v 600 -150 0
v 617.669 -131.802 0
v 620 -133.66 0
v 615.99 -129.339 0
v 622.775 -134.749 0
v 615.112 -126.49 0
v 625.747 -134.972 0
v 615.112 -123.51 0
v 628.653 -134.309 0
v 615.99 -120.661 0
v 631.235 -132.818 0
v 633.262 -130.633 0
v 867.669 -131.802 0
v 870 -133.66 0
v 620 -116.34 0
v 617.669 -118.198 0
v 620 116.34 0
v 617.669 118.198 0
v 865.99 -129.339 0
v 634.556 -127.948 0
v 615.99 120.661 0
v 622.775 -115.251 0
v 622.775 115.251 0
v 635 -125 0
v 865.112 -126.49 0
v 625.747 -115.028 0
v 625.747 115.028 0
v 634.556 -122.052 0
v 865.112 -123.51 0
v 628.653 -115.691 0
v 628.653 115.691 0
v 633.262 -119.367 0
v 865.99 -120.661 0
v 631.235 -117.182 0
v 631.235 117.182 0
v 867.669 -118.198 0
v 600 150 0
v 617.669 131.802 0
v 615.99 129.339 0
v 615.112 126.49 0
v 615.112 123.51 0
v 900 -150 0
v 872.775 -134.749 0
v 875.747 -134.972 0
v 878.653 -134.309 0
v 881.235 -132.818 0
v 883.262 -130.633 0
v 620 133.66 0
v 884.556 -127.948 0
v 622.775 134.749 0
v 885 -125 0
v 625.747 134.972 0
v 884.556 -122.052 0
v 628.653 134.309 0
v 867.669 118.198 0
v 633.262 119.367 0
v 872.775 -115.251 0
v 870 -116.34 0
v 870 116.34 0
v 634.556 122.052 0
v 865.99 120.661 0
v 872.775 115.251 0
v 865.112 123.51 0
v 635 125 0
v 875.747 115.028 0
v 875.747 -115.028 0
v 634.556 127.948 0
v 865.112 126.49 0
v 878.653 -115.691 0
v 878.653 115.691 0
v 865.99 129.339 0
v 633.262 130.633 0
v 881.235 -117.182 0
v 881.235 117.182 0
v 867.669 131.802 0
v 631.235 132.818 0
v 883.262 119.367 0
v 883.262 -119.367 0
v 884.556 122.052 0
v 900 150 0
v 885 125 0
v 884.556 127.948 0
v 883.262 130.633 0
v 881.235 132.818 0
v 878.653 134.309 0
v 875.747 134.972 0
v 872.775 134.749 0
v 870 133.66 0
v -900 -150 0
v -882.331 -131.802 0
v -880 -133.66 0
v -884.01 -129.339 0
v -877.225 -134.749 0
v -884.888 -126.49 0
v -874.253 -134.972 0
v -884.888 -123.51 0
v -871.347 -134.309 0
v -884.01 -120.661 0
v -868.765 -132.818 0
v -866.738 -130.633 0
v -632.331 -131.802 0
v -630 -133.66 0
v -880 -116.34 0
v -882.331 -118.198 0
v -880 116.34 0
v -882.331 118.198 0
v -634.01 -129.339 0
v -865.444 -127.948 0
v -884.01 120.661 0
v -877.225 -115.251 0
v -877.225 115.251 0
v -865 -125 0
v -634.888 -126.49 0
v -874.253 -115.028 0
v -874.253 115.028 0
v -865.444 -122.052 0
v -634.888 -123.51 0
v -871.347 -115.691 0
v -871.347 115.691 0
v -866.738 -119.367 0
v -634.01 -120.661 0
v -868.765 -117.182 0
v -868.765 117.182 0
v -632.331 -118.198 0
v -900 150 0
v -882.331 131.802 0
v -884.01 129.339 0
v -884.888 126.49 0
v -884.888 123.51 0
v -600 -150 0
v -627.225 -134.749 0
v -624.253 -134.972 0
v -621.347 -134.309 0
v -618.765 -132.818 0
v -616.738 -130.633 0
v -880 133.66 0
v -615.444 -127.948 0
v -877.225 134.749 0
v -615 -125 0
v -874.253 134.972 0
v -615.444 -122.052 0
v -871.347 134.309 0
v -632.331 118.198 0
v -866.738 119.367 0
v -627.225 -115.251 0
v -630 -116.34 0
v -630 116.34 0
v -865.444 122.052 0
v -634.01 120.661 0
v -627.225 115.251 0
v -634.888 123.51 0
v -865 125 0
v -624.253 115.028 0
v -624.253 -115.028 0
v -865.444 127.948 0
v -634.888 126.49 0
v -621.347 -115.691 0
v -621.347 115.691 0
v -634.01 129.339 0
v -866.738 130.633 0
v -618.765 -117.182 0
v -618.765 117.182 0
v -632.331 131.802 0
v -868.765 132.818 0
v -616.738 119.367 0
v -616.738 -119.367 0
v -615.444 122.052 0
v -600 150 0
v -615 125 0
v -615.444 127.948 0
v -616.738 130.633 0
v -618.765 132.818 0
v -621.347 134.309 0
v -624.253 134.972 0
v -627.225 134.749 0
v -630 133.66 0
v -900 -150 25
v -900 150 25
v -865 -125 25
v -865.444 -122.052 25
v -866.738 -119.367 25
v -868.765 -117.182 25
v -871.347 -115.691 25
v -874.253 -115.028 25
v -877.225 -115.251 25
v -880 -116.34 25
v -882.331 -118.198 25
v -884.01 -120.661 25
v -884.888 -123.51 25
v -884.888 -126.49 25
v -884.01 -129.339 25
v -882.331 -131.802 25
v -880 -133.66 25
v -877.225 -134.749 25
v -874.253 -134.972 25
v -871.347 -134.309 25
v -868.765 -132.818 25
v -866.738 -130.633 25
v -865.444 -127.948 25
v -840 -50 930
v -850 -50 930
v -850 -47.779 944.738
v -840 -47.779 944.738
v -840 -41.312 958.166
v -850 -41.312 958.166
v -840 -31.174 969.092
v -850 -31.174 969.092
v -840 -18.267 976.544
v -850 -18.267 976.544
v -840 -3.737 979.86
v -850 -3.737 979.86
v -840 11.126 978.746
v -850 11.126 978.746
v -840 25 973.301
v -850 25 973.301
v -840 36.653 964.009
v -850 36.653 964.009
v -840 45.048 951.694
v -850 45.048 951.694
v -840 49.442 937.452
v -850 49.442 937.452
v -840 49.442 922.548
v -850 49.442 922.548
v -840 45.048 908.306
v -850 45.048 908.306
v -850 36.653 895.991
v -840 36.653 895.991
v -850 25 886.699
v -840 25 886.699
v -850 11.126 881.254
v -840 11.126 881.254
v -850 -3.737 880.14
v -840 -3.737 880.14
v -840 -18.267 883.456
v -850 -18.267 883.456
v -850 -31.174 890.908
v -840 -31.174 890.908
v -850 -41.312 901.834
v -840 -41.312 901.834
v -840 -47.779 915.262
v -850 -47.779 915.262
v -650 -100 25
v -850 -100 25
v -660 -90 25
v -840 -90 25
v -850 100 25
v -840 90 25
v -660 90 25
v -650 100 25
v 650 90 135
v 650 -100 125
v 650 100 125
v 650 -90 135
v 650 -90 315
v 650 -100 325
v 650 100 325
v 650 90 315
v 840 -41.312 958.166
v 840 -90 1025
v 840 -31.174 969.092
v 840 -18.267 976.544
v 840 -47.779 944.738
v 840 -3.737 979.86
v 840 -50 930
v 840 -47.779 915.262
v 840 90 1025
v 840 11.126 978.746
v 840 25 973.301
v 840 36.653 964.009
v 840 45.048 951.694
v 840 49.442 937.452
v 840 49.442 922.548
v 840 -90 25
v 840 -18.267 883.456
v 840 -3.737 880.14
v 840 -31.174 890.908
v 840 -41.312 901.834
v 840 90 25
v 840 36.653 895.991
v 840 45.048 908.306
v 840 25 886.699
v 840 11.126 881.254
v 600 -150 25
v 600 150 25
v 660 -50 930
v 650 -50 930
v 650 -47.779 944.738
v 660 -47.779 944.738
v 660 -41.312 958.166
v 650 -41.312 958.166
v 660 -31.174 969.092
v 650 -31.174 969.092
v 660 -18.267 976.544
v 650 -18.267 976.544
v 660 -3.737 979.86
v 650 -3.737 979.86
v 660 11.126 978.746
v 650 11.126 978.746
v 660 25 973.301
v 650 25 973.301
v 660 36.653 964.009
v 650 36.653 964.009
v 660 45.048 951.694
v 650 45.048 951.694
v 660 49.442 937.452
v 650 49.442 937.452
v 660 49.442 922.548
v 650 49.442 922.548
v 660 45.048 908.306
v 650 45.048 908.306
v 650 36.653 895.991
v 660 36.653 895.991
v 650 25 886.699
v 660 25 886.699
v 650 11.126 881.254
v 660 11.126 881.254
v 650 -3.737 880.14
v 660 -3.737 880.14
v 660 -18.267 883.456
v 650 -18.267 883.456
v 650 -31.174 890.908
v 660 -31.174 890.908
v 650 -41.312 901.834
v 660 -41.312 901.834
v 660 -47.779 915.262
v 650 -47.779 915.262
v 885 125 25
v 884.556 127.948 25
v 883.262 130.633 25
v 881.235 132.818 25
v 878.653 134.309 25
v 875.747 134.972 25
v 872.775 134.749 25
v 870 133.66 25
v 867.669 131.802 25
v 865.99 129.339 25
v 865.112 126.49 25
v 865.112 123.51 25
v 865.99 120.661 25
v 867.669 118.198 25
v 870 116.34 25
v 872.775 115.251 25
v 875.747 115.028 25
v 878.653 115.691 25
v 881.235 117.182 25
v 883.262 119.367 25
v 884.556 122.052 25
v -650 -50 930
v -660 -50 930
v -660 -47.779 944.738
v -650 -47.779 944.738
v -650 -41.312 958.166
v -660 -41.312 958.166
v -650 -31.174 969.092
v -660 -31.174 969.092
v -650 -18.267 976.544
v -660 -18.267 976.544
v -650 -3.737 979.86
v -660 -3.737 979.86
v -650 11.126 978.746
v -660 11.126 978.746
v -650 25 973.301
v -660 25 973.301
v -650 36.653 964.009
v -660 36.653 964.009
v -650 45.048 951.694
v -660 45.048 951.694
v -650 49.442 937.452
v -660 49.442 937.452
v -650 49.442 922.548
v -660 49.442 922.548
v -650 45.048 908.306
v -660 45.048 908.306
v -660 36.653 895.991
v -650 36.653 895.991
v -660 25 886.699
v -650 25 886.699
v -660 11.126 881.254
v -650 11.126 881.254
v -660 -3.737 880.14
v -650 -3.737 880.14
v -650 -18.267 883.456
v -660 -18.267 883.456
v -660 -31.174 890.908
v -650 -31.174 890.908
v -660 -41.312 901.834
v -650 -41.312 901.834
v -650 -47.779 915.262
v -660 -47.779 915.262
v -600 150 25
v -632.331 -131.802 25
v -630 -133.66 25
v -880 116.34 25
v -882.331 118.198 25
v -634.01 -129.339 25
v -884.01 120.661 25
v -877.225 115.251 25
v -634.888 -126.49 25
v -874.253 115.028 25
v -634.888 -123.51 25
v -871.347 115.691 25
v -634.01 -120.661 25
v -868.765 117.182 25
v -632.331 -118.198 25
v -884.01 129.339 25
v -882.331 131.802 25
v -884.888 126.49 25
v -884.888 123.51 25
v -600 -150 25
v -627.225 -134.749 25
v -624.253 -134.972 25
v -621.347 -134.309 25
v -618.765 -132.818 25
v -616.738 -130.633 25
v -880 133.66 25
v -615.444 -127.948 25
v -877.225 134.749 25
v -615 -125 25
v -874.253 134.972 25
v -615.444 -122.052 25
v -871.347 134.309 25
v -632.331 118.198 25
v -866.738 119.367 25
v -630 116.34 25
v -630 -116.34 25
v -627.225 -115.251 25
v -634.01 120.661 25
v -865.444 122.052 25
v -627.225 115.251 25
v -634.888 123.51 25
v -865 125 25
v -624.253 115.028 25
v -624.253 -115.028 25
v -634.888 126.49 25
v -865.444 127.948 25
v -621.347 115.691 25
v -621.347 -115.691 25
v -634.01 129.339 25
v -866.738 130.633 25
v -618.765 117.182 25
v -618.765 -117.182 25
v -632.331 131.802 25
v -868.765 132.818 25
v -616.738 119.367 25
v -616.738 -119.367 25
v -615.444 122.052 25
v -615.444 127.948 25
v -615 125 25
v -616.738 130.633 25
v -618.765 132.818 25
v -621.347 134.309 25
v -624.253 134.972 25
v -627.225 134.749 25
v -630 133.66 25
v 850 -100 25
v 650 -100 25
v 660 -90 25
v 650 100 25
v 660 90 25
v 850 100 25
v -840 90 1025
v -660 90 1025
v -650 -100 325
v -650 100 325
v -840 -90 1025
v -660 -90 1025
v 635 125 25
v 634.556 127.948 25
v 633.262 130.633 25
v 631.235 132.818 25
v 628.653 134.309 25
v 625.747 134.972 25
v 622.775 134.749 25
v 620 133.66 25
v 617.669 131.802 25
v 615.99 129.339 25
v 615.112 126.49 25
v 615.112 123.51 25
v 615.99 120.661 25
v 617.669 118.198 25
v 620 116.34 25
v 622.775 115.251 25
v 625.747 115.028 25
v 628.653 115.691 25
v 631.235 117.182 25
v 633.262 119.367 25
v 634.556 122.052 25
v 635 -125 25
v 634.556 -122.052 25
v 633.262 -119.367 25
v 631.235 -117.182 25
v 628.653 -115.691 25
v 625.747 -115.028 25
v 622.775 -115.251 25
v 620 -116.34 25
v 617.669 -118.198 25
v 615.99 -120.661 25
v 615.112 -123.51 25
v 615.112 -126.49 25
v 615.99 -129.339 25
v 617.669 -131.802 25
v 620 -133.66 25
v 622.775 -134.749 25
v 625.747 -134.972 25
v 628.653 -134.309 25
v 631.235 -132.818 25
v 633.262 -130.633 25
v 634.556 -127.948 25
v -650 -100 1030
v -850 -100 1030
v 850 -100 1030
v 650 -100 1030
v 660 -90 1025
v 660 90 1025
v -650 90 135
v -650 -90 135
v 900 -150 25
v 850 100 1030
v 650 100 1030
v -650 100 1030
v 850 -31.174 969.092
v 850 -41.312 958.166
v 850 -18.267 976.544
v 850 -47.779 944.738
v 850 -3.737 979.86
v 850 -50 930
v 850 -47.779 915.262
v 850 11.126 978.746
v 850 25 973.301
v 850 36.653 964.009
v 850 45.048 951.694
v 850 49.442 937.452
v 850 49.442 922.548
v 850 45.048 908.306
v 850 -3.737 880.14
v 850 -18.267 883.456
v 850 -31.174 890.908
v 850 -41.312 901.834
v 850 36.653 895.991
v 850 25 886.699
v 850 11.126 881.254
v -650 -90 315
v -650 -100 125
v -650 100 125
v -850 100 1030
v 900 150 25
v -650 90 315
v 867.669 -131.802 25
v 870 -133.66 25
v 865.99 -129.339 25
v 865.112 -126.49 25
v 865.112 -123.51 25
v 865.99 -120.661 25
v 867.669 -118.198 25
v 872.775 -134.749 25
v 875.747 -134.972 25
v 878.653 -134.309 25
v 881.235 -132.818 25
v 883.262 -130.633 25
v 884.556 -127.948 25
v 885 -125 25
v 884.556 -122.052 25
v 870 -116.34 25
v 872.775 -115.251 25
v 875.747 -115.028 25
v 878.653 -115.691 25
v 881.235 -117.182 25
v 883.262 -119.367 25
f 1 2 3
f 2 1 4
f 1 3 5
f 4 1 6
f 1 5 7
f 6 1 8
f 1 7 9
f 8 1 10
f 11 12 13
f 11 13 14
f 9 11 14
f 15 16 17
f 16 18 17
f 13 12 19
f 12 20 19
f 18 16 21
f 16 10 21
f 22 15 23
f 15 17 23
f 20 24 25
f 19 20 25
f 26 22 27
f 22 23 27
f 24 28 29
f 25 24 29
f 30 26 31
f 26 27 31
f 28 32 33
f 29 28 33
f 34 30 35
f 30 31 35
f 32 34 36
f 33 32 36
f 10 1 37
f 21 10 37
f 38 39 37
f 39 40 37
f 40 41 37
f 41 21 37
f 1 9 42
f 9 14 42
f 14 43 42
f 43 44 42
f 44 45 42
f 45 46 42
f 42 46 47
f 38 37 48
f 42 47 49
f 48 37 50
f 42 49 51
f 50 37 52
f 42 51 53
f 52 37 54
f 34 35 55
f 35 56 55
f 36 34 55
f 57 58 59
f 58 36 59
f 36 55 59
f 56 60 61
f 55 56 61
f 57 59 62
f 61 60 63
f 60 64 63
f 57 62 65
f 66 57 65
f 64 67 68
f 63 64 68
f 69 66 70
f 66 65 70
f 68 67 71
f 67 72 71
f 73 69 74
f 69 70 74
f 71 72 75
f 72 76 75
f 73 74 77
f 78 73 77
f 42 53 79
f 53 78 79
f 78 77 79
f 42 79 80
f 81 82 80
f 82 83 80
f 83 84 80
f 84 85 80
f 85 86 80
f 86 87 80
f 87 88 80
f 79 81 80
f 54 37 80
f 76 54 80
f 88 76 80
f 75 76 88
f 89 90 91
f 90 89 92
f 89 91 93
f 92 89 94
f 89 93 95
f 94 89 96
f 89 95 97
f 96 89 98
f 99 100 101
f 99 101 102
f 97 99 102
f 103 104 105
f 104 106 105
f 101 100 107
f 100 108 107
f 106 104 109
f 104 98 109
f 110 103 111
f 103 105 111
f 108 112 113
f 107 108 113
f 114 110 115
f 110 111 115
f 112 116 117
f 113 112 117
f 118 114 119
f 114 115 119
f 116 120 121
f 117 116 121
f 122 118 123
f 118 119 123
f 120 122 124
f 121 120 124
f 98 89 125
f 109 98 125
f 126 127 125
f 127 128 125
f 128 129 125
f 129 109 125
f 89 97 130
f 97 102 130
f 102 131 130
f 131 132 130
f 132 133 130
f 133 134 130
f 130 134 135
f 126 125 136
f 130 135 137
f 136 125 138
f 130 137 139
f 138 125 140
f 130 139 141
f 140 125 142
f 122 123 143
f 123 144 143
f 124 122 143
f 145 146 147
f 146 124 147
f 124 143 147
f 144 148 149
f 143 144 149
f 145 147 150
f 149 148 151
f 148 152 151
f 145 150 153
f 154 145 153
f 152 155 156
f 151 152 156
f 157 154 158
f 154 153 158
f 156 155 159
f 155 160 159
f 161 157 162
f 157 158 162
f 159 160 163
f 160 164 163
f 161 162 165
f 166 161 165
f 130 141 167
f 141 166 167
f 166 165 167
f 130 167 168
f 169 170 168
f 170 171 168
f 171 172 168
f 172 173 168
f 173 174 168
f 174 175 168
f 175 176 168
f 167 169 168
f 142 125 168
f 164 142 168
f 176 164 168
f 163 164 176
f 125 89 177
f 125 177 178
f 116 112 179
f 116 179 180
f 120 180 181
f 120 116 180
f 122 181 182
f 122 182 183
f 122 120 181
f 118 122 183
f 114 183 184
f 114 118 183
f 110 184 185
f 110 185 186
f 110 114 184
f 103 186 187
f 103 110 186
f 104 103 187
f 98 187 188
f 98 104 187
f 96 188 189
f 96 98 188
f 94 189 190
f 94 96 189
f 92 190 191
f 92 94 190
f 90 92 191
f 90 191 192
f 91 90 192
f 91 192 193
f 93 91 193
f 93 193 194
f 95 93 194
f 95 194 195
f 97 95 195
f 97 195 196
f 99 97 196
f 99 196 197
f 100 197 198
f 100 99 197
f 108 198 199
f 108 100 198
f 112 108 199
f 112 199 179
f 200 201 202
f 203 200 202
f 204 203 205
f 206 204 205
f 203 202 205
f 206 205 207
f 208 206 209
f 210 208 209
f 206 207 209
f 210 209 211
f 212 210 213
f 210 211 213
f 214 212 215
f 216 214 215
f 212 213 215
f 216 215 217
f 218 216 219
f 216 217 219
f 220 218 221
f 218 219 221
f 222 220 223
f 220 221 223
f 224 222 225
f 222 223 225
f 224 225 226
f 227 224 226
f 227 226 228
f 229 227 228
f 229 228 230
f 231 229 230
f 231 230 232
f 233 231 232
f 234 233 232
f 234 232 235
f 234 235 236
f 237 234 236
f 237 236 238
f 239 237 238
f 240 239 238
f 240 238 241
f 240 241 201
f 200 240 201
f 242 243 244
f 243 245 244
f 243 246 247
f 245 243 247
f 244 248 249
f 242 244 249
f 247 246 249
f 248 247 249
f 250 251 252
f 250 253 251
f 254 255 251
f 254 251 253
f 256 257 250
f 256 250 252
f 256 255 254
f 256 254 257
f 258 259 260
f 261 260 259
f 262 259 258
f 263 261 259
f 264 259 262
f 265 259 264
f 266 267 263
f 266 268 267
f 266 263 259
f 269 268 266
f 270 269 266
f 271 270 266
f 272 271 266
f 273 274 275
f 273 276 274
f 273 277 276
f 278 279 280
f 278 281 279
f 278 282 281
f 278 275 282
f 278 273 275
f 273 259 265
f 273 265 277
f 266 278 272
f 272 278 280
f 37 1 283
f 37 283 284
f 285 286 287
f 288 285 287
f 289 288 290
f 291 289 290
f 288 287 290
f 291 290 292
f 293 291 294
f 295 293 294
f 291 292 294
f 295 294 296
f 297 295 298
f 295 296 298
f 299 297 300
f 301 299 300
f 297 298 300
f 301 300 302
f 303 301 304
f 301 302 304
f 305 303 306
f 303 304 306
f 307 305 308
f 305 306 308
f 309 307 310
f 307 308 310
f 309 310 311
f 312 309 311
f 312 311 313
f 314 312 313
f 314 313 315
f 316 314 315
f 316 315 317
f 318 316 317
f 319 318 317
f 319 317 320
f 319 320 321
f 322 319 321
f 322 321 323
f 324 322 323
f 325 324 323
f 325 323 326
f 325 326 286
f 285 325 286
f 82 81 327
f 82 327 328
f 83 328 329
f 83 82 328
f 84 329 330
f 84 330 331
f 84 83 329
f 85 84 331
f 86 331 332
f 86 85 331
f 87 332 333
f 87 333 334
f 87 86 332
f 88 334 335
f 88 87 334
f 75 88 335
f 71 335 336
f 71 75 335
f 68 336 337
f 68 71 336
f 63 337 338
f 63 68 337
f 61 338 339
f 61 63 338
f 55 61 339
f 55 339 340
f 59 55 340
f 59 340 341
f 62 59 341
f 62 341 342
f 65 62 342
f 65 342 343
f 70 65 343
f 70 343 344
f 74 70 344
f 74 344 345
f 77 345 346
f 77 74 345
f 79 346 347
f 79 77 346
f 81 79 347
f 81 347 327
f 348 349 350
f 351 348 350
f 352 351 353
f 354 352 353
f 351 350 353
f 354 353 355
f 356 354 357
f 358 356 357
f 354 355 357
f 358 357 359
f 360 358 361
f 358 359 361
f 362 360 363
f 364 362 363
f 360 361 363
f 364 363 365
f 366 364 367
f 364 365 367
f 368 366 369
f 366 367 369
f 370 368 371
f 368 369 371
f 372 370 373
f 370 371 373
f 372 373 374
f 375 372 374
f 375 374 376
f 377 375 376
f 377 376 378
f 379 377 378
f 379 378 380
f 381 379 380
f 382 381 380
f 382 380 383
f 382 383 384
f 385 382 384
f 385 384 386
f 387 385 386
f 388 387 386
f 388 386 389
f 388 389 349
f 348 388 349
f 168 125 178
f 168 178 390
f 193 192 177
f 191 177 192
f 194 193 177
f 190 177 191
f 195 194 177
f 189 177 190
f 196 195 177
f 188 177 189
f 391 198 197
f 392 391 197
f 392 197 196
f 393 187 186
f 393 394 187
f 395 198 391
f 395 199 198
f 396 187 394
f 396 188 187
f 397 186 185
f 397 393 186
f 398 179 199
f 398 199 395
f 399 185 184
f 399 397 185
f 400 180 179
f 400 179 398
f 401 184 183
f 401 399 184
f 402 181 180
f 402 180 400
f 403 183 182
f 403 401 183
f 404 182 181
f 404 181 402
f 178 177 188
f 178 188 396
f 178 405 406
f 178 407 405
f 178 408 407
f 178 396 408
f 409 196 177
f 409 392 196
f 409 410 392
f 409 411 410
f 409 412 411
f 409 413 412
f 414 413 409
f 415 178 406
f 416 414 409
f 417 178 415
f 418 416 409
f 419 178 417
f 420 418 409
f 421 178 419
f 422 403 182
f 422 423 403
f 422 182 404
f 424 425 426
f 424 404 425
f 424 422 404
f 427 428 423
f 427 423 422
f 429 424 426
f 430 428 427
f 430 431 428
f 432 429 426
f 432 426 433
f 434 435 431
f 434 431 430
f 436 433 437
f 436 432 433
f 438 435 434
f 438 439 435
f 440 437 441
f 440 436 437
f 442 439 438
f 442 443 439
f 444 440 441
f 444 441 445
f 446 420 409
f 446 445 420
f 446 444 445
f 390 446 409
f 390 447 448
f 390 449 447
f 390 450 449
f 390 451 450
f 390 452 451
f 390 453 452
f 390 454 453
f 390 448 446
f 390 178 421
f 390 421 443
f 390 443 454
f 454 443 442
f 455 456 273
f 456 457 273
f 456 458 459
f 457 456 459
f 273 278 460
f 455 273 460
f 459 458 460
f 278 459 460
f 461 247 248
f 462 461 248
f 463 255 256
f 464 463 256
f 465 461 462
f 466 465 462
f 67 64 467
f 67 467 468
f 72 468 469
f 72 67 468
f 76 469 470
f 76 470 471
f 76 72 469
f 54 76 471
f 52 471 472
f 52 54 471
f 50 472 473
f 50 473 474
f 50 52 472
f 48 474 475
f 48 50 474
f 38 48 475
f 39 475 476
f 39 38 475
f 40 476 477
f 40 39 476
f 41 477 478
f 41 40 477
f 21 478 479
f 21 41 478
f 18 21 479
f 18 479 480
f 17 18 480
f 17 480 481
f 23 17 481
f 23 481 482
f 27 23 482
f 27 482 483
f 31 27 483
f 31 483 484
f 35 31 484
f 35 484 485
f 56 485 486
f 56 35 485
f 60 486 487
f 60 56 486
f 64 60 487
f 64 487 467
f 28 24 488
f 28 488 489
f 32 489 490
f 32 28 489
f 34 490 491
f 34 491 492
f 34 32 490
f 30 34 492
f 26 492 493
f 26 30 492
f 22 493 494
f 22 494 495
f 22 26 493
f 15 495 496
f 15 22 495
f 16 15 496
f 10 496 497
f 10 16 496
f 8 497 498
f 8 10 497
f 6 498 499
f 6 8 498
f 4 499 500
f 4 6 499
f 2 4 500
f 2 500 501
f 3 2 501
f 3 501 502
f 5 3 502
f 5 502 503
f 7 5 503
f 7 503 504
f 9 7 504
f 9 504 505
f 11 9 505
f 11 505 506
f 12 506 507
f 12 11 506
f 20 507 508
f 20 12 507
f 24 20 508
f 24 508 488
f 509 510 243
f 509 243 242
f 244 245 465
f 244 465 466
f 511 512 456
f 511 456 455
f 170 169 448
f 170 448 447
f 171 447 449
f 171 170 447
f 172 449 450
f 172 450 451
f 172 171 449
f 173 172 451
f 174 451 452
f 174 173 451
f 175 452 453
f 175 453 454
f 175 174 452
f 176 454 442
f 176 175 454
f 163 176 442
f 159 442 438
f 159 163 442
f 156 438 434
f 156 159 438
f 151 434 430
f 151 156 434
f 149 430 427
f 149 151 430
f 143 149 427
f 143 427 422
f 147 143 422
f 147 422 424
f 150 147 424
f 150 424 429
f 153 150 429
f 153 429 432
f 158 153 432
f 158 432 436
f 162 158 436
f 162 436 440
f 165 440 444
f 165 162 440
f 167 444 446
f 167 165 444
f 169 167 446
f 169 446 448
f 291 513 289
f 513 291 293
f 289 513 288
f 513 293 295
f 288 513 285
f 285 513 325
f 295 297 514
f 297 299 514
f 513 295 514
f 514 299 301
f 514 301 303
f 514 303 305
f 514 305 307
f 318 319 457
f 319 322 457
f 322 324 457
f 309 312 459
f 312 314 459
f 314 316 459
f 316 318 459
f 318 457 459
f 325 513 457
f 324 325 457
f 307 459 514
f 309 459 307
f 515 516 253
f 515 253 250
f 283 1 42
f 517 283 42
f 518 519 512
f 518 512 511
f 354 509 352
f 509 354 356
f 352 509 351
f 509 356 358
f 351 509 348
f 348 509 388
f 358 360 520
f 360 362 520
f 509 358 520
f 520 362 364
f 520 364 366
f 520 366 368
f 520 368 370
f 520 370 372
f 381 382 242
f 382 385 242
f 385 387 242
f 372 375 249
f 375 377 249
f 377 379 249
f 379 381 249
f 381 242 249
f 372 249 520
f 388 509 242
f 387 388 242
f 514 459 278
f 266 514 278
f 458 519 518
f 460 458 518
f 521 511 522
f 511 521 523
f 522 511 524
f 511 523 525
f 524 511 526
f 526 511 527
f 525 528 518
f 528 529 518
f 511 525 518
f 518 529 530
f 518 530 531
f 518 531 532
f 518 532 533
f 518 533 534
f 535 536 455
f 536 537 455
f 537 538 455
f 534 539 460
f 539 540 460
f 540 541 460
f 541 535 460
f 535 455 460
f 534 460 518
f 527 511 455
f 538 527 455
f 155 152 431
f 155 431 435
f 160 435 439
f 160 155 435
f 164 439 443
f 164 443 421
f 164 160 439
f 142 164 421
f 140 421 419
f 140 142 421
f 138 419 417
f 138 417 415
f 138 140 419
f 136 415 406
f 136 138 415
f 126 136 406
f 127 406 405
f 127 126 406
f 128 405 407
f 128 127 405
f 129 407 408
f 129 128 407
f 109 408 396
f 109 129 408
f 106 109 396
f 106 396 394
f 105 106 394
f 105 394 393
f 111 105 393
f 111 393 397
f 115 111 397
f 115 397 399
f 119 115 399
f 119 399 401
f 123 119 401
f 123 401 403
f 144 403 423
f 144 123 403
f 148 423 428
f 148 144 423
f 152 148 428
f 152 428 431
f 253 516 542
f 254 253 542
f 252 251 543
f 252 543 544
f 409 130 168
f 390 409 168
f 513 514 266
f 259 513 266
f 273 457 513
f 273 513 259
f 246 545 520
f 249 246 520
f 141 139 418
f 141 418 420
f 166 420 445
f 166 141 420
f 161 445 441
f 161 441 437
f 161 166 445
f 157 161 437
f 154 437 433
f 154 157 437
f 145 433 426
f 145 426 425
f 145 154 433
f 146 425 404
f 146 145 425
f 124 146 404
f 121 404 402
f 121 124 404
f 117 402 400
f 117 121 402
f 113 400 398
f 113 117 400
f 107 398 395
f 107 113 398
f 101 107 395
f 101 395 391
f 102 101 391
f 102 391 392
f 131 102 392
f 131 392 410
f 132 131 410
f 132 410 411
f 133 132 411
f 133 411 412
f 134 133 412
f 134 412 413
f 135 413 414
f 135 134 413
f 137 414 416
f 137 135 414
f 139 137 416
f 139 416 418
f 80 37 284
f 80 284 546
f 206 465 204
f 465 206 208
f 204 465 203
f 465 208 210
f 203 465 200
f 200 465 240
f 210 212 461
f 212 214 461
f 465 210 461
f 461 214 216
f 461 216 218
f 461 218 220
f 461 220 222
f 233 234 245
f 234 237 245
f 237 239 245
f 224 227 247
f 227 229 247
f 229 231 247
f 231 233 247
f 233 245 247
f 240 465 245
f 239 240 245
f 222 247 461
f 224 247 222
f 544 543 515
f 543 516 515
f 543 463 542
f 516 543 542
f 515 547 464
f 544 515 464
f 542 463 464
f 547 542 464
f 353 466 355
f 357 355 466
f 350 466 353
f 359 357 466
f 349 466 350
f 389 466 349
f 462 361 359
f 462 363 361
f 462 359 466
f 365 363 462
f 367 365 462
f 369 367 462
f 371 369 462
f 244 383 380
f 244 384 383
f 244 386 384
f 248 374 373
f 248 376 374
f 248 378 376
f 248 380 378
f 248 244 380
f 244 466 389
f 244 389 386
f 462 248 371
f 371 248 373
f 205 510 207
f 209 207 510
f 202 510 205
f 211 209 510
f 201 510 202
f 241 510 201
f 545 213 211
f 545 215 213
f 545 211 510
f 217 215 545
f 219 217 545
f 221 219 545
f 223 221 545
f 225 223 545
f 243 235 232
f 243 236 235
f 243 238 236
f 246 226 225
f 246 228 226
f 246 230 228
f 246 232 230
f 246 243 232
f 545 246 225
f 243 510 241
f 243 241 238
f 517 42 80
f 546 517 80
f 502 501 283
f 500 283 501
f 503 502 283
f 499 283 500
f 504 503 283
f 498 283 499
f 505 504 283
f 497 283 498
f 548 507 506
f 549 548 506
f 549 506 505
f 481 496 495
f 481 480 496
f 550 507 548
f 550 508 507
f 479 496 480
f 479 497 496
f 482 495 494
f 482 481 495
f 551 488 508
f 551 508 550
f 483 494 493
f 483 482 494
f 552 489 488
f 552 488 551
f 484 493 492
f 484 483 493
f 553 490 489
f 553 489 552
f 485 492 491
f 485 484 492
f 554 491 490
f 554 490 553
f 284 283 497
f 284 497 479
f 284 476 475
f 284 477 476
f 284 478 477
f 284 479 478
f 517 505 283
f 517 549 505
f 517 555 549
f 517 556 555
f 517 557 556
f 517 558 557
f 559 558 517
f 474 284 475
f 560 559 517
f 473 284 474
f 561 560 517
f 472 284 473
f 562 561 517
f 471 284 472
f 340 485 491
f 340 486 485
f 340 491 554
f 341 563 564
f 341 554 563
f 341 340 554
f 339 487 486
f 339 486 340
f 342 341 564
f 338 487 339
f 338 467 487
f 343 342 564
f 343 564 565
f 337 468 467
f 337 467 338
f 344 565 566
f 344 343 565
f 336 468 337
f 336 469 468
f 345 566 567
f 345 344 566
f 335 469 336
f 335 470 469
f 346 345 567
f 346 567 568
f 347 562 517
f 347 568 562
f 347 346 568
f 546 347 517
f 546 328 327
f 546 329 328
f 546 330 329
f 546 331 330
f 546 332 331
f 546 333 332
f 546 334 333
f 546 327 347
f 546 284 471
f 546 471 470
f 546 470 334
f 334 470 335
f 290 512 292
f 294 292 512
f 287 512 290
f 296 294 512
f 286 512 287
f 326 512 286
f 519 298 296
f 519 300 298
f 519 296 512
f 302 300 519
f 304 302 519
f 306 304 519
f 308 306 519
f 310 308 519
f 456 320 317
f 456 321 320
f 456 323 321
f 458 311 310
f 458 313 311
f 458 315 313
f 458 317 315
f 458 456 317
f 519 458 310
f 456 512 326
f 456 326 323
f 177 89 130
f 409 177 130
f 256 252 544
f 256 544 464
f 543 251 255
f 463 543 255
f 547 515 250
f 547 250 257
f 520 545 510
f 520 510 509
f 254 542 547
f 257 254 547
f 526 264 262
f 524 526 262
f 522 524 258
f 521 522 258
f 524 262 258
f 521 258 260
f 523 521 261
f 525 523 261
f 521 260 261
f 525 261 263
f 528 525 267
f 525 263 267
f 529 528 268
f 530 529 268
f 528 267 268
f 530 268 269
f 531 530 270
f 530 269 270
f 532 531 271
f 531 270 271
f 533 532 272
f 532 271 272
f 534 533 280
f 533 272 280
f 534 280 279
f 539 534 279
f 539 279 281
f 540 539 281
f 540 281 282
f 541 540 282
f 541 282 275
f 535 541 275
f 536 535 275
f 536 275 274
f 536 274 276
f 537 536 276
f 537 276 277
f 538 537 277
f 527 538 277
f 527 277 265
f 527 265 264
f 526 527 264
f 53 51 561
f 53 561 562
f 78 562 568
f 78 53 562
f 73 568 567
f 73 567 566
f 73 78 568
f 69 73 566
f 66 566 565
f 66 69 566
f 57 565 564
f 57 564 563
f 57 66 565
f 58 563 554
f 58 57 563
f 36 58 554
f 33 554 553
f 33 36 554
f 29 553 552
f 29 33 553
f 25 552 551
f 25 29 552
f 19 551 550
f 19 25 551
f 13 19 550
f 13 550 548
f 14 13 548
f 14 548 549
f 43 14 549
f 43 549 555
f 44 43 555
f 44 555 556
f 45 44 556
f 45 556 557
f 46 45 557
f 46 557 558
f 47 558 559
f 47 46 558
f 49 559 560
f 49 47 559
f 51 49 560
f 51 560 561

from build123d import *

# Parameters (mm, degrees)
F0_W      = 300
F0_H      = 300
F0_R      = 10
F1_DEPTH  = 25
F2_W      = 200
F2_H      = 200
F2_W_2    = 180
F2_H_2    = 180
F3_DEPTH  = 1000
F4_W      = 200
F4_H      = 200
F4_W_2    = 180
F4_H_2    = 180
F5_DEPTH  = 1300
F6_W      = 200
F6_H      = 200
F7_DEPTH  = 5
F8_W      = 200
F8_H      = 200
F9_DEPTH  = 5
F10_R     = 50
F11_DEPTH = 1750.001


with BuildPart() as f1:
    # F0 (on Top) → F1 (new body)
    with BuildSketch(Plane.XY):
        with Locations((-750, 0)):
            Rectangle(F0_W, F0_H)
        with Locations((-875, -125)):
            Circle(F0_R, mode=Mode.SUBTRACT)
        with Locations((-625, -125)):
            Circle(F0_R, mode=Mode.SUBTRACT)
        with Locations((-875, 125)):
            Circle(F0_R, mode=Mode.SUBTRACT)
        with Locations((-625, 125)):
            Circle(F0_R, mode=Mode.SUBTRACT)
    extrude(amount=F1_DEPTH)


with BuildPart() as f1b:
    # F0 (on Top) → F1, piece 2 (new body)
    with BuildSketch(Plane.XY):
        with Locations((750, 0)):
            Rectangle(F0_W, F0_H)
        with Locations((625, -125)):
            Circle(F0_R, mode=Mode.SUBTRACT)
        with Locations((875, -125)):
            Circle(F0_R, mode=Mode.SUBTRACT)
        with Locations((625, 125)):
            Circle(F0_R, mode=Mode.SUBTRACT)
        with Locations((875, 125)):
            Circle(F0_R, mode=Mode.SUBTRACT)
    extrude(amount=F1_DEPTH)


with BuildPart() as f3:
    # F2 (on face) → F3 (new body)
    with BuildSketch(Plane.XY.offset(25)):
        with Locations((-750, 0)):
            Rectangle(F2_W, F2_H)
        with Locations((-750, 0)):
            Rectangle(F2_W_2, F2_H_2, mode=Mode.SUBTRACT)
    extrude(amount=F3_DEPTH)

    # F6 (on face) → F7 (join)
    with BuildSketch(Plane.XY.offset(1025)):
        with Locations((-750, 0)):
            Rectangle(F6_W, F6_H)
    extrude(amount=F7_DEPTH)


with BuildPart() as f3b:
    # F2 (on face) → F3, piece 2 (new body)
    with BuildSketch(Plane.XY.offset(25)):
        with Locations((750, 0)):
            Rectangle(F2_W, F2_H)
        with Locations((750, 0)):
            Rectangle(F2_W_2, F2_H_2, mode=Mode.SUBTRACT)
    extrude(amount=F3_DEPTH)

    # F8 (on face) → F9 (join)
    with BuildSketch(Plane.XY.offset(1025)):
        with Locations((750, 0)):
            Rectangle(F8_W, F8_H)
    extrude(amount=F9_DEPTH)


with BuildPart() as f5:
    # F4 (on face) → F5 (new body, through all)
    with BuildSketch(Plane.YZ.offset(-650)):
        with Locations((0, 225)):
            Rectangle(F4_W, F4_H)
        with Locations((0, 225)):
            Rectangle(F4_W_2, F4_H_2, mode=Mode.SUBTRACT)
    extrude(amount=F5_DEPTH)


with BuildPart() as f11_tool:
    # F10 (on face) → F11 (new body, through all)
    with BuildSketch(Plane(origin=(-850, 0, 0), x_dir=(0, -1, 0), z_dir=(-1, 0, 0))):
        with Locations((0, 930)):
            Circle(F10_R)
    extrude(amount=-F11_DEPTH)


with BuildPart() as f3_1:
    add(f3.part)

    # F11: cut by f11_tool
    add(f11_tool.part, mode=Mode.SUBTRACT)


with BuildPart() as f3b_1:
    add(f3b.part)

    # F11: cut by f11_tool
    add(f11_tool.part, mode=Mode.SUBTRACT)


solid = Compound([f1.part, f1b.part, f5.part, f3_1.part, f3b_1.part])
